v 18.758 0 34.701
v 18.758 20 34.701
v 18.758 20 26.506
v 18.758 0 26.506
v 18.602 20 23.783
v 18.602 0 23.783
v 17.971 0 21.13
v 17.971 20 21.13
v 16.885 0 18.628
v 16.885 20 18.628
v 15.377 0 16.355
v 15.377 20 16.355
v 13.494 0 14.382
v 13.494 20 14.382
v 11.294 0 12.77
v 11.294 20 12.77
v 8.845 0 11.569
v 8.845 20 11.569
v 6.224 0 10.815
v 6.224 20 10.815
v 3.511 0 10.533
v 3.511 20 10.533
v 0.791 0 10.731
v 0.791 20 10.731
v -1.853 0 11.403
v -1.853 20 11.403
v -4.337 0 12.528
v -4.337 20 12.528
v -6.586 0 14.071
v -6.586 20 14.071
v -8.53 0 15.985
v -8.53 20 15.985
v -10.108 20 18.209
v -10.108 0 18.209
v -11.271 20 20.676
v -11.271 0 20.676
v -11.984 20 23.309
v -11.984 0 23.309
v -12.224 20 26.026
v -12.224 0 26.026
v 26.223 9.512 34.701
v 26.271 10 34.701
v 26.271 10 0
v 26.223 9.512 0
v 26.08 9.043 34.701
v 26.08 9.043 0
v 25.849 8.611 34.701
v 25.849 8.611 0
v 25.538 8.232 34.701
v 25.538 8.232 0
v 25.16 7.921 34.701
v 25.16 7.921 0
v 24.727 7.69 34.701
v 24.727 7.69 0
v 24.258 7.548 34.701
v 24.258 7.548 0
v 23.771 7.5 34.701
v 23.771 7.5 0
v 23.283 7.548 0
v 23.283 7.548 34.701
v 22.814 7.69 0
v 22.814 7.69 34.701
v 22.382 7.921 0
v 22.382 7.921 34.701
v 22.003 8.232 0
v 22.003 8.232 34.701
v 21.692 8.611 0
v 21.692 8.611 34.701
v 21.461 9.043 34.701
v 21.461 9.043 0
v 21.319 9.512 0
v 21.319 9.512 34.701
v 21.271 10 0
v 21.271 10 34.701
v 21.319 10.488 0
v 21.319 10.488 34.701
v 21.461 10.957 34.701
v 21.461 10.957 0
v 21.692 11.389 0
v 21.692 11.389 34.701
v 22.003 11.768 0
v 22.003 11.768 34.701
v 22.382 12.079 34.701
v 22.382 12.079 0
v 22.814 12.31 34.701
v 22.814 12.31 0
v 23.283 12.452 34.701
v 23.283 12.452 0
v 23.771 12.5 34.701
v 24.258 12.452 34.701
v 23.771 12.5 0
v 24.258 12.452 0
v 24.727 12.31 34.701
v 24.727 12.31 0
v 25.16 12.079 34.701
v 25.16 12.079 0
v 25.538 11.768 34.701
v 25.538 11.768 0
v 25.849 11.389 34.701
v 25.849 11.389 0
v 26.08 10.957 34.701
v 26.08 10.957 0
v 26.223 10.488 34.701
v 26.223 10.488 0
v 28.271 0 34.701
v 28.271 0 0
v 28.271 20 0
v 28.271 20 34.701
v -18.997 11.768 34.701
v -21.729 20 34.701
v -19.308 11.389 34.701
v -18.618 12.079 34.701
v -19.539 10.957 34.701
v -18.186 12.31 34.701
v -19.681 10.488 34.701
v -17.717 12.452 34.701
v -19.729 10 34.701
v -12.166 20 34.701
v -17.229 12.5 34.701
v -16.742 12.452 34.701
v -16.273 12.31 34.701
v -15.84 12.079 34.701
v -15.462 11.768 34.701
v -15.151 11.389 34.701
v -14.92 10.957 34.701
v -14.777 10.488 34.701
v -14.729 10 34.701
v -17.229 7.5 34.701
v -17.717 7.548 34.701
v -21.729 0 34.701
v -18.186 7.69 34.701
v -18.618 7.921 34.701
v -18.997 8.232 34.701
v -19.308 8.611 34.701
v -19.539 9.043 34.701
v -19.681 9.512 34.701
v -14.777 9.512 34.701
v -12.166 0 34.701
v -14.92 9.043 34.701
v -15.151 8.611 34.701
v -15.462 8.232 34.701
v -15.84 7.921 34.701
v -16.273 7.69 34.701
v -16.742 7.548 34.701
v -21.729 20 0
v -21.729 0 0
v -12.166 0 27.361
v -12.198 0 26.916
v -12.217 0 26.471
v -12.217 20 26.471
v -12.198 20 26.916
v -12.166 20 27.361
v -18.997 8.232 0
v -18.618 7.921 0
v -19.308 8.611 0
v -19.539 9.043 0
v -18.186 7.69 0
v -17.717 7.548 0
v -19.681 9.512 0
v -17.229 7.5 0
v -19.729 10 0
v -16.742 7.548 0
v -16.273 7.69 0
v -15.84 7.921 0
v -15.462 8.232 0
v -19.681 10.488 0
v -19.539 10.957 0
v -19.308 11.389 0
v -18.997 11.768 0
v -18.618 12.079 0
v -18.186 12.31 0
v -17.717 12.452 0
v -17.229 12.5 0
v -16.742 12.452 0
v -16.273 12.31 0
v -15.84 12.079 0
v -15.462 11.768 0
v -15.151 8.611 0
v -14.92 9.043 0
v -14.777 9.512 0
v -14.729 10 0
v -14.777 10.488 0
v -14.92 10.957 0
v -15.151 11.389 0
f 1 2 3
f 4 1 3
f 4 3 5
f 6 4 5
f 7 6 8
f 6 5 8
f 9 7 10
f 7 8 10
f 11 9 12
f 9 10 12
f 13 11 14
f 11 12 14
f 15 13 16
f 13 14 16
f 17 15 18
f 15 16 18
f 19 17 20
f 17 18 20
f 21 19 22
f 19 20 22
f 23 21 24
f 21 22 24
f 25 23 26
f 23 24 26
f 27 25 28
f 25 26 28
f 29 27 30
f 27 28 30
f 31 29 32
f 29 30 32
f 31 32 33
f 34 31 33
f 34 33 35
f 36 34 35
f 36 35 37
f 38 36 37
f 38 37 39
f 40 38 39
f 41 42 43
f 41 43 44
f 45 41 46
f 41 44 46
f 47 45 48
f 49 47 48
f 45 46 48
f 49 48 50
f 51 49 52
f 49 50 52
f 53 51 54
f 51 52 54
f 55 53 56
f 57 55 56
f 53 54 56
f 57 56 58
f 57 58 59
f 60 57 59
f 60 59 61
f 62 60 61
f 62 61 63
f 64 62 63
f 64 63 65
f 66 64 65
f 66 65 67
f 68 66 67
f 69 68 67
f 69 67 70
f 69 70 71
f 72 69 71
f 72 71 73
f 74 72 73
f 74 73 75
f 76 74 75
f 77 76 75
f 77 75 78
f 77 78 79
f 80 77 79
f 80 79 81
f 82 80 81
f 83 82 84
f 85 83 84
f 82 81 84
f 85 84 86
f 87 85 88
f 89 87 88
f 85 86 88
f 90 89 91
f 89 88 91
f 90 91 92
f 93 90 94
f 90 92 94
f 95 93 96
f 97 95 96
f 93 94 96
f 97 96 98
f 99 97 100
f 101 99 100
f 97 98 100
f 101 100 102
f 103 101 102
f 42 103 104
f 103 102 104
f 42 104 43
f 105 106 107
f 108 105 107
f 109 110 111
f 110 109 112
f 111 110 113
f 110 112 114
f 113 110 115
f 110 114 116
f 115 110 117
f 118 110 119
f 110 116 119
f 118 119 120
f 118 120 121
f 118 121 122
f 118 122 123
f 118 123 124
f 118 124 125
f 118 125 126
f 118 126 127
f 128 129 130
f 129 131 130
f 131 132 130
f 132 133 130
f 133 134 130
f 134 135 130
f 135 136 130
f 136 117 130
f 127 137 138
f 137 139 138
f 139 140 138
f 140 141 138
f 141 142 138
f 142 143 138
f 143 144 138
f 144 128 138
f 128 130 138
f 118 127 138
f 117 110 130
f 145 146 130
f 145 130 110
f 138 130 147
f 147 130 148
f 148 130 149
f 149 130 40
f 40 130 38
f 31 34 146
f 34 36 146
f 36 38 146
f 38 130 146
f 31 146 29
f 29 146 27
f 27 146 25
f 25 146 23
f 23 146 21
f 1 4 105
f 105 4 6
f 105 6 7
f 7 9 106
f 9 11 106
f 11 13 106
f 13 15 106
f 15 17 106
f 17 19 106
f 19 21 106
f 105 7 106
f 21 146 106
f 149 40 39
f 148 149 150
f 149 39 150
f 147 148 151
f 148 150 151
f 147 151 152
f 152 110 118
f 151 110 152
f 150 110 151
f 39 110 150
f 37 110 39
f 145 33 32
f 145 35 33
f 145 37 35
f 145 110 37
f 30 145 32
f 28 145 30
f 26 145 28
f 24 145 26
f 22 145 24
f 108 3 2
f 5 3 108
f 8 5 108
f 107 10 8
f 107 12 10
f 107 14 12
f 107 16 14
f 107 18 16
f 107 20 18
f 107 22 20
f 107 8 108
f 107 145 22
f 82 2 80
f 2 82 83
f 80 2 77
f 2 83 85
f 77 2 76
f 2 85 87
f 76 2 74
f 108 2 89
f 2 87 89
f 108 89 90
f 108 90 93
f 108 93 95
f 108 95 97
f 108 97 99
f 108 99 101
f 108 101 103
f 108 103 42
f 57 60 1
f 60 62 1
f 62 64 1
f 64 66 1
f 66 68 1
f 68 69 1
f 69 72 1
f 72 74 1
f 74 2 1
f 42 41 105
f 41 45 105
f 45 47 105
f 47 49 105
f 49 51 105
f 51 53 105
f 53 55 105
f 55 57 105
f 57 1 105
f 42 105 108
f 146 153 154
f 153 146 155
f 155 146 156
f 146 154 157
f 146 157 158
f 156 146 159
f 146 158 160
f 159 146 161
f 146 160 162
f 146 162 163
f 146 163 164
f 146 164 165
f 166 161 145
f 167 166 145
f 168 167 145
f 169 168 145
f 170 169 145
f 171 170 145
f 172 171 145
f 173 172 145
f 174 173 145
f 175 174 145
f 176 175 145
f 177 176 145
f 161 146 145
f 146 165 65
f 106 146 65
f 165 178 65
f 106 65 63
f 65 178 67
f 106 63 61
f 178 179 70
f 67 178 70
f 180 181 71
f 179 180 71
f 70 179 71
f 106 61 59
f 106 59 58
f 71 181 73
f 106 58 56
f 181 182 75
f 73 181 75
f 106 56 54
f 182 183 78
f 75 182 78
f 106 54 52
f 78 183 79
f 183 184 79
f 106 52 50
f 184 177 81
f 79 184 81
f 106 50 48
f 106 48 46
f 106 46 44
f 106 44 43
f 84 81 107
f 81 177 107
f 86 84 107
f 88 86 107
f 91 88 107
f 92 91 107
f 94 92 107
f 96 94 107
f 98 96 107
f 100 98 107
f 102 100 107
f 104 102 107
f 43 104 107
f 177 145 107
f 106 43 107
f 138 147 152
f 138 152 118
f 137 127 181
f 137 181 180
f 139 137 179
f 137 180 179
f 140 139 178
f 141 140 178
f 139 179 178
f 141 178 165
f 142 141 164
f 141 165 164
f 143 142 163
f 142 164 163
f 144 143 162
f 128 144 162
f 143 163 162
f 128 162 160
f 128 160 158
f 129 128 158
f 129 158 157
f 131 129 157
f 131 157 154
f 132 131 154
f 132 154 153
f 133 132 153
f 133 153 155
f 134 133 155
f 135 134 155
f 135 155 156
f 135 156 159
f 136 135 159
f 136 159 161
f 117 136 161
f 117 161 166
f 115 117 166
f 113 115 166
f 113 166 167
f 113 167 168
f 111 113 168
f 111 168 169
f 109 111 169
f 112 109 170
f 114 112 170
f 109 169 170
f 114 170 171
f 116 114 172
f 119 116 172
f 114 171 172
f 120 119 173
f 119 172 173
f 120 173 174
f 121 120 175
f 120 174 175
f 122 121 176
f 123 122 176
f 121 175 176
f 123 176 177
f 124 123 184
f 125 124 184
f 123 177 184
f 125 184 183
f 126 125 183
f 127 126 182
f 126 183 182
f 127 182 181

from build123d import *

# Parameters (mm, degrees)
F0_W     = 50
F0_H     = 20
F1_DEPTH = 60
F2_W     = 9
F2_H     = 25.2990102768
F2_W_2   = 32
F3_DEPTH = 25
F4_R     = 2.5
F5_DEPTH = 60
F7_DEPTH = 25
F9_DEPTH = 25


with BuildPart() as f1:
    # F0 (on Top) → F1 (new body)
    with BuildSketch(Plane.XY):
        with Locations((3.2706648111, 10)):
            Rectangle(F0_W, F0_H)
    extrude(amount=F1_DEPTH)

    # F2 (on face) → F3 (cut)
    with BuildSketch(Plane.XZ):
        with Locations((-17.2293351889, 47.3504948616)):
            Rectangle(F2_W, F2_H)
        with Locations((23.7706648111, 47.3504948616)):
            Rectangle(F2_W, F2_H)
        with Locations((3.2706648111, 47.3504948616)):
            Rectangle(F2_W_2, F2_H)
    extrude(amount=-F3_DEPTH, mode=Mode.SUBTRACT)

    # F4 (on face) → F5 (cut)
    with BuildSketch(Plane(origin=(0, 0, 0), x_dir=(1, 0, 0), z_dir=(0, 0, -1))):
        with Locations((23.7706648111, -10)):
            Circle(F4_R)
        with Locations((-17.2293351889, -10)):
            Circle(F4_R)
    extrude(amount=-F5_DEPTH, mode=Mode.SUBTRACT)

    # F6 (on face) → F7 (cut)
    with BuildSketch(Plane(origin=(0, 20, 0), x_dir=(-1, 0, 0), z_dir=(0, 1, 0))):
        with BuildLine():
            Line((-16.1088471688, 34.7009897232), (9.5675175466, 34.7009897232))
            ThreePointArc((9.5675175466, 34.7009897232), (-3.2706648111, 41.520220155), (-16.1088471688, 34.7009897232))
        make_face()
        with BuildLine():
            ThreePointArc((12.2238130515, 26.0257422924), (11.5448638087, 30.562145708), (9.5675175466, 34.7009897232))
            Line((9.5675175466, 34.7009897232), (-16.1088471688, 34.7009897232))
            ThreePointArc((-16.1088471688, 34.7009897232), (-7.8070682267, 11.2102136725), (12.2238130515, 26.0257422924))
        make_face()
    extrude(amount=-F7_DEPTH, mode=Mode.SUBTRACT)

    # F8 (on face) → F9 (cut)
    with BuildSketch(Plane(origin=(0, 20, 0), x_dir=(-1, 0, 0), z_dir=(0, 1, 0))):
        with BuildLine():
            Line((-18.7576970823, 34.7009897232), (-18.7576970823, 26.5060293604))
            ThreePointArc((-18.7576970823, 26.5060293604), (-18.0140969007, 30.7912490289), (-16.1088471688, 34.7009897232))
            Line((-16.1088471688, 34.7009897232), (-18.7576970823, 34.7009897232))
        make_face()
        with BuildLine():
            ThreePointArc((9.5675175466, 34.7009897232), (11.3354625842, 31.1968047313), (12.1661882356, 27.3608124208))
            Line((12.1661882356, 27.3608124208), (12.1661882356, 34.7009897232))
            Line((12.1661882356, 34.7009897232), (9.5675175466, 34.7009897232))
        make_face()
    extrude(amount=-F9_DEPTH, mode=Mode.SUBTRACT)


solid = f1.part
